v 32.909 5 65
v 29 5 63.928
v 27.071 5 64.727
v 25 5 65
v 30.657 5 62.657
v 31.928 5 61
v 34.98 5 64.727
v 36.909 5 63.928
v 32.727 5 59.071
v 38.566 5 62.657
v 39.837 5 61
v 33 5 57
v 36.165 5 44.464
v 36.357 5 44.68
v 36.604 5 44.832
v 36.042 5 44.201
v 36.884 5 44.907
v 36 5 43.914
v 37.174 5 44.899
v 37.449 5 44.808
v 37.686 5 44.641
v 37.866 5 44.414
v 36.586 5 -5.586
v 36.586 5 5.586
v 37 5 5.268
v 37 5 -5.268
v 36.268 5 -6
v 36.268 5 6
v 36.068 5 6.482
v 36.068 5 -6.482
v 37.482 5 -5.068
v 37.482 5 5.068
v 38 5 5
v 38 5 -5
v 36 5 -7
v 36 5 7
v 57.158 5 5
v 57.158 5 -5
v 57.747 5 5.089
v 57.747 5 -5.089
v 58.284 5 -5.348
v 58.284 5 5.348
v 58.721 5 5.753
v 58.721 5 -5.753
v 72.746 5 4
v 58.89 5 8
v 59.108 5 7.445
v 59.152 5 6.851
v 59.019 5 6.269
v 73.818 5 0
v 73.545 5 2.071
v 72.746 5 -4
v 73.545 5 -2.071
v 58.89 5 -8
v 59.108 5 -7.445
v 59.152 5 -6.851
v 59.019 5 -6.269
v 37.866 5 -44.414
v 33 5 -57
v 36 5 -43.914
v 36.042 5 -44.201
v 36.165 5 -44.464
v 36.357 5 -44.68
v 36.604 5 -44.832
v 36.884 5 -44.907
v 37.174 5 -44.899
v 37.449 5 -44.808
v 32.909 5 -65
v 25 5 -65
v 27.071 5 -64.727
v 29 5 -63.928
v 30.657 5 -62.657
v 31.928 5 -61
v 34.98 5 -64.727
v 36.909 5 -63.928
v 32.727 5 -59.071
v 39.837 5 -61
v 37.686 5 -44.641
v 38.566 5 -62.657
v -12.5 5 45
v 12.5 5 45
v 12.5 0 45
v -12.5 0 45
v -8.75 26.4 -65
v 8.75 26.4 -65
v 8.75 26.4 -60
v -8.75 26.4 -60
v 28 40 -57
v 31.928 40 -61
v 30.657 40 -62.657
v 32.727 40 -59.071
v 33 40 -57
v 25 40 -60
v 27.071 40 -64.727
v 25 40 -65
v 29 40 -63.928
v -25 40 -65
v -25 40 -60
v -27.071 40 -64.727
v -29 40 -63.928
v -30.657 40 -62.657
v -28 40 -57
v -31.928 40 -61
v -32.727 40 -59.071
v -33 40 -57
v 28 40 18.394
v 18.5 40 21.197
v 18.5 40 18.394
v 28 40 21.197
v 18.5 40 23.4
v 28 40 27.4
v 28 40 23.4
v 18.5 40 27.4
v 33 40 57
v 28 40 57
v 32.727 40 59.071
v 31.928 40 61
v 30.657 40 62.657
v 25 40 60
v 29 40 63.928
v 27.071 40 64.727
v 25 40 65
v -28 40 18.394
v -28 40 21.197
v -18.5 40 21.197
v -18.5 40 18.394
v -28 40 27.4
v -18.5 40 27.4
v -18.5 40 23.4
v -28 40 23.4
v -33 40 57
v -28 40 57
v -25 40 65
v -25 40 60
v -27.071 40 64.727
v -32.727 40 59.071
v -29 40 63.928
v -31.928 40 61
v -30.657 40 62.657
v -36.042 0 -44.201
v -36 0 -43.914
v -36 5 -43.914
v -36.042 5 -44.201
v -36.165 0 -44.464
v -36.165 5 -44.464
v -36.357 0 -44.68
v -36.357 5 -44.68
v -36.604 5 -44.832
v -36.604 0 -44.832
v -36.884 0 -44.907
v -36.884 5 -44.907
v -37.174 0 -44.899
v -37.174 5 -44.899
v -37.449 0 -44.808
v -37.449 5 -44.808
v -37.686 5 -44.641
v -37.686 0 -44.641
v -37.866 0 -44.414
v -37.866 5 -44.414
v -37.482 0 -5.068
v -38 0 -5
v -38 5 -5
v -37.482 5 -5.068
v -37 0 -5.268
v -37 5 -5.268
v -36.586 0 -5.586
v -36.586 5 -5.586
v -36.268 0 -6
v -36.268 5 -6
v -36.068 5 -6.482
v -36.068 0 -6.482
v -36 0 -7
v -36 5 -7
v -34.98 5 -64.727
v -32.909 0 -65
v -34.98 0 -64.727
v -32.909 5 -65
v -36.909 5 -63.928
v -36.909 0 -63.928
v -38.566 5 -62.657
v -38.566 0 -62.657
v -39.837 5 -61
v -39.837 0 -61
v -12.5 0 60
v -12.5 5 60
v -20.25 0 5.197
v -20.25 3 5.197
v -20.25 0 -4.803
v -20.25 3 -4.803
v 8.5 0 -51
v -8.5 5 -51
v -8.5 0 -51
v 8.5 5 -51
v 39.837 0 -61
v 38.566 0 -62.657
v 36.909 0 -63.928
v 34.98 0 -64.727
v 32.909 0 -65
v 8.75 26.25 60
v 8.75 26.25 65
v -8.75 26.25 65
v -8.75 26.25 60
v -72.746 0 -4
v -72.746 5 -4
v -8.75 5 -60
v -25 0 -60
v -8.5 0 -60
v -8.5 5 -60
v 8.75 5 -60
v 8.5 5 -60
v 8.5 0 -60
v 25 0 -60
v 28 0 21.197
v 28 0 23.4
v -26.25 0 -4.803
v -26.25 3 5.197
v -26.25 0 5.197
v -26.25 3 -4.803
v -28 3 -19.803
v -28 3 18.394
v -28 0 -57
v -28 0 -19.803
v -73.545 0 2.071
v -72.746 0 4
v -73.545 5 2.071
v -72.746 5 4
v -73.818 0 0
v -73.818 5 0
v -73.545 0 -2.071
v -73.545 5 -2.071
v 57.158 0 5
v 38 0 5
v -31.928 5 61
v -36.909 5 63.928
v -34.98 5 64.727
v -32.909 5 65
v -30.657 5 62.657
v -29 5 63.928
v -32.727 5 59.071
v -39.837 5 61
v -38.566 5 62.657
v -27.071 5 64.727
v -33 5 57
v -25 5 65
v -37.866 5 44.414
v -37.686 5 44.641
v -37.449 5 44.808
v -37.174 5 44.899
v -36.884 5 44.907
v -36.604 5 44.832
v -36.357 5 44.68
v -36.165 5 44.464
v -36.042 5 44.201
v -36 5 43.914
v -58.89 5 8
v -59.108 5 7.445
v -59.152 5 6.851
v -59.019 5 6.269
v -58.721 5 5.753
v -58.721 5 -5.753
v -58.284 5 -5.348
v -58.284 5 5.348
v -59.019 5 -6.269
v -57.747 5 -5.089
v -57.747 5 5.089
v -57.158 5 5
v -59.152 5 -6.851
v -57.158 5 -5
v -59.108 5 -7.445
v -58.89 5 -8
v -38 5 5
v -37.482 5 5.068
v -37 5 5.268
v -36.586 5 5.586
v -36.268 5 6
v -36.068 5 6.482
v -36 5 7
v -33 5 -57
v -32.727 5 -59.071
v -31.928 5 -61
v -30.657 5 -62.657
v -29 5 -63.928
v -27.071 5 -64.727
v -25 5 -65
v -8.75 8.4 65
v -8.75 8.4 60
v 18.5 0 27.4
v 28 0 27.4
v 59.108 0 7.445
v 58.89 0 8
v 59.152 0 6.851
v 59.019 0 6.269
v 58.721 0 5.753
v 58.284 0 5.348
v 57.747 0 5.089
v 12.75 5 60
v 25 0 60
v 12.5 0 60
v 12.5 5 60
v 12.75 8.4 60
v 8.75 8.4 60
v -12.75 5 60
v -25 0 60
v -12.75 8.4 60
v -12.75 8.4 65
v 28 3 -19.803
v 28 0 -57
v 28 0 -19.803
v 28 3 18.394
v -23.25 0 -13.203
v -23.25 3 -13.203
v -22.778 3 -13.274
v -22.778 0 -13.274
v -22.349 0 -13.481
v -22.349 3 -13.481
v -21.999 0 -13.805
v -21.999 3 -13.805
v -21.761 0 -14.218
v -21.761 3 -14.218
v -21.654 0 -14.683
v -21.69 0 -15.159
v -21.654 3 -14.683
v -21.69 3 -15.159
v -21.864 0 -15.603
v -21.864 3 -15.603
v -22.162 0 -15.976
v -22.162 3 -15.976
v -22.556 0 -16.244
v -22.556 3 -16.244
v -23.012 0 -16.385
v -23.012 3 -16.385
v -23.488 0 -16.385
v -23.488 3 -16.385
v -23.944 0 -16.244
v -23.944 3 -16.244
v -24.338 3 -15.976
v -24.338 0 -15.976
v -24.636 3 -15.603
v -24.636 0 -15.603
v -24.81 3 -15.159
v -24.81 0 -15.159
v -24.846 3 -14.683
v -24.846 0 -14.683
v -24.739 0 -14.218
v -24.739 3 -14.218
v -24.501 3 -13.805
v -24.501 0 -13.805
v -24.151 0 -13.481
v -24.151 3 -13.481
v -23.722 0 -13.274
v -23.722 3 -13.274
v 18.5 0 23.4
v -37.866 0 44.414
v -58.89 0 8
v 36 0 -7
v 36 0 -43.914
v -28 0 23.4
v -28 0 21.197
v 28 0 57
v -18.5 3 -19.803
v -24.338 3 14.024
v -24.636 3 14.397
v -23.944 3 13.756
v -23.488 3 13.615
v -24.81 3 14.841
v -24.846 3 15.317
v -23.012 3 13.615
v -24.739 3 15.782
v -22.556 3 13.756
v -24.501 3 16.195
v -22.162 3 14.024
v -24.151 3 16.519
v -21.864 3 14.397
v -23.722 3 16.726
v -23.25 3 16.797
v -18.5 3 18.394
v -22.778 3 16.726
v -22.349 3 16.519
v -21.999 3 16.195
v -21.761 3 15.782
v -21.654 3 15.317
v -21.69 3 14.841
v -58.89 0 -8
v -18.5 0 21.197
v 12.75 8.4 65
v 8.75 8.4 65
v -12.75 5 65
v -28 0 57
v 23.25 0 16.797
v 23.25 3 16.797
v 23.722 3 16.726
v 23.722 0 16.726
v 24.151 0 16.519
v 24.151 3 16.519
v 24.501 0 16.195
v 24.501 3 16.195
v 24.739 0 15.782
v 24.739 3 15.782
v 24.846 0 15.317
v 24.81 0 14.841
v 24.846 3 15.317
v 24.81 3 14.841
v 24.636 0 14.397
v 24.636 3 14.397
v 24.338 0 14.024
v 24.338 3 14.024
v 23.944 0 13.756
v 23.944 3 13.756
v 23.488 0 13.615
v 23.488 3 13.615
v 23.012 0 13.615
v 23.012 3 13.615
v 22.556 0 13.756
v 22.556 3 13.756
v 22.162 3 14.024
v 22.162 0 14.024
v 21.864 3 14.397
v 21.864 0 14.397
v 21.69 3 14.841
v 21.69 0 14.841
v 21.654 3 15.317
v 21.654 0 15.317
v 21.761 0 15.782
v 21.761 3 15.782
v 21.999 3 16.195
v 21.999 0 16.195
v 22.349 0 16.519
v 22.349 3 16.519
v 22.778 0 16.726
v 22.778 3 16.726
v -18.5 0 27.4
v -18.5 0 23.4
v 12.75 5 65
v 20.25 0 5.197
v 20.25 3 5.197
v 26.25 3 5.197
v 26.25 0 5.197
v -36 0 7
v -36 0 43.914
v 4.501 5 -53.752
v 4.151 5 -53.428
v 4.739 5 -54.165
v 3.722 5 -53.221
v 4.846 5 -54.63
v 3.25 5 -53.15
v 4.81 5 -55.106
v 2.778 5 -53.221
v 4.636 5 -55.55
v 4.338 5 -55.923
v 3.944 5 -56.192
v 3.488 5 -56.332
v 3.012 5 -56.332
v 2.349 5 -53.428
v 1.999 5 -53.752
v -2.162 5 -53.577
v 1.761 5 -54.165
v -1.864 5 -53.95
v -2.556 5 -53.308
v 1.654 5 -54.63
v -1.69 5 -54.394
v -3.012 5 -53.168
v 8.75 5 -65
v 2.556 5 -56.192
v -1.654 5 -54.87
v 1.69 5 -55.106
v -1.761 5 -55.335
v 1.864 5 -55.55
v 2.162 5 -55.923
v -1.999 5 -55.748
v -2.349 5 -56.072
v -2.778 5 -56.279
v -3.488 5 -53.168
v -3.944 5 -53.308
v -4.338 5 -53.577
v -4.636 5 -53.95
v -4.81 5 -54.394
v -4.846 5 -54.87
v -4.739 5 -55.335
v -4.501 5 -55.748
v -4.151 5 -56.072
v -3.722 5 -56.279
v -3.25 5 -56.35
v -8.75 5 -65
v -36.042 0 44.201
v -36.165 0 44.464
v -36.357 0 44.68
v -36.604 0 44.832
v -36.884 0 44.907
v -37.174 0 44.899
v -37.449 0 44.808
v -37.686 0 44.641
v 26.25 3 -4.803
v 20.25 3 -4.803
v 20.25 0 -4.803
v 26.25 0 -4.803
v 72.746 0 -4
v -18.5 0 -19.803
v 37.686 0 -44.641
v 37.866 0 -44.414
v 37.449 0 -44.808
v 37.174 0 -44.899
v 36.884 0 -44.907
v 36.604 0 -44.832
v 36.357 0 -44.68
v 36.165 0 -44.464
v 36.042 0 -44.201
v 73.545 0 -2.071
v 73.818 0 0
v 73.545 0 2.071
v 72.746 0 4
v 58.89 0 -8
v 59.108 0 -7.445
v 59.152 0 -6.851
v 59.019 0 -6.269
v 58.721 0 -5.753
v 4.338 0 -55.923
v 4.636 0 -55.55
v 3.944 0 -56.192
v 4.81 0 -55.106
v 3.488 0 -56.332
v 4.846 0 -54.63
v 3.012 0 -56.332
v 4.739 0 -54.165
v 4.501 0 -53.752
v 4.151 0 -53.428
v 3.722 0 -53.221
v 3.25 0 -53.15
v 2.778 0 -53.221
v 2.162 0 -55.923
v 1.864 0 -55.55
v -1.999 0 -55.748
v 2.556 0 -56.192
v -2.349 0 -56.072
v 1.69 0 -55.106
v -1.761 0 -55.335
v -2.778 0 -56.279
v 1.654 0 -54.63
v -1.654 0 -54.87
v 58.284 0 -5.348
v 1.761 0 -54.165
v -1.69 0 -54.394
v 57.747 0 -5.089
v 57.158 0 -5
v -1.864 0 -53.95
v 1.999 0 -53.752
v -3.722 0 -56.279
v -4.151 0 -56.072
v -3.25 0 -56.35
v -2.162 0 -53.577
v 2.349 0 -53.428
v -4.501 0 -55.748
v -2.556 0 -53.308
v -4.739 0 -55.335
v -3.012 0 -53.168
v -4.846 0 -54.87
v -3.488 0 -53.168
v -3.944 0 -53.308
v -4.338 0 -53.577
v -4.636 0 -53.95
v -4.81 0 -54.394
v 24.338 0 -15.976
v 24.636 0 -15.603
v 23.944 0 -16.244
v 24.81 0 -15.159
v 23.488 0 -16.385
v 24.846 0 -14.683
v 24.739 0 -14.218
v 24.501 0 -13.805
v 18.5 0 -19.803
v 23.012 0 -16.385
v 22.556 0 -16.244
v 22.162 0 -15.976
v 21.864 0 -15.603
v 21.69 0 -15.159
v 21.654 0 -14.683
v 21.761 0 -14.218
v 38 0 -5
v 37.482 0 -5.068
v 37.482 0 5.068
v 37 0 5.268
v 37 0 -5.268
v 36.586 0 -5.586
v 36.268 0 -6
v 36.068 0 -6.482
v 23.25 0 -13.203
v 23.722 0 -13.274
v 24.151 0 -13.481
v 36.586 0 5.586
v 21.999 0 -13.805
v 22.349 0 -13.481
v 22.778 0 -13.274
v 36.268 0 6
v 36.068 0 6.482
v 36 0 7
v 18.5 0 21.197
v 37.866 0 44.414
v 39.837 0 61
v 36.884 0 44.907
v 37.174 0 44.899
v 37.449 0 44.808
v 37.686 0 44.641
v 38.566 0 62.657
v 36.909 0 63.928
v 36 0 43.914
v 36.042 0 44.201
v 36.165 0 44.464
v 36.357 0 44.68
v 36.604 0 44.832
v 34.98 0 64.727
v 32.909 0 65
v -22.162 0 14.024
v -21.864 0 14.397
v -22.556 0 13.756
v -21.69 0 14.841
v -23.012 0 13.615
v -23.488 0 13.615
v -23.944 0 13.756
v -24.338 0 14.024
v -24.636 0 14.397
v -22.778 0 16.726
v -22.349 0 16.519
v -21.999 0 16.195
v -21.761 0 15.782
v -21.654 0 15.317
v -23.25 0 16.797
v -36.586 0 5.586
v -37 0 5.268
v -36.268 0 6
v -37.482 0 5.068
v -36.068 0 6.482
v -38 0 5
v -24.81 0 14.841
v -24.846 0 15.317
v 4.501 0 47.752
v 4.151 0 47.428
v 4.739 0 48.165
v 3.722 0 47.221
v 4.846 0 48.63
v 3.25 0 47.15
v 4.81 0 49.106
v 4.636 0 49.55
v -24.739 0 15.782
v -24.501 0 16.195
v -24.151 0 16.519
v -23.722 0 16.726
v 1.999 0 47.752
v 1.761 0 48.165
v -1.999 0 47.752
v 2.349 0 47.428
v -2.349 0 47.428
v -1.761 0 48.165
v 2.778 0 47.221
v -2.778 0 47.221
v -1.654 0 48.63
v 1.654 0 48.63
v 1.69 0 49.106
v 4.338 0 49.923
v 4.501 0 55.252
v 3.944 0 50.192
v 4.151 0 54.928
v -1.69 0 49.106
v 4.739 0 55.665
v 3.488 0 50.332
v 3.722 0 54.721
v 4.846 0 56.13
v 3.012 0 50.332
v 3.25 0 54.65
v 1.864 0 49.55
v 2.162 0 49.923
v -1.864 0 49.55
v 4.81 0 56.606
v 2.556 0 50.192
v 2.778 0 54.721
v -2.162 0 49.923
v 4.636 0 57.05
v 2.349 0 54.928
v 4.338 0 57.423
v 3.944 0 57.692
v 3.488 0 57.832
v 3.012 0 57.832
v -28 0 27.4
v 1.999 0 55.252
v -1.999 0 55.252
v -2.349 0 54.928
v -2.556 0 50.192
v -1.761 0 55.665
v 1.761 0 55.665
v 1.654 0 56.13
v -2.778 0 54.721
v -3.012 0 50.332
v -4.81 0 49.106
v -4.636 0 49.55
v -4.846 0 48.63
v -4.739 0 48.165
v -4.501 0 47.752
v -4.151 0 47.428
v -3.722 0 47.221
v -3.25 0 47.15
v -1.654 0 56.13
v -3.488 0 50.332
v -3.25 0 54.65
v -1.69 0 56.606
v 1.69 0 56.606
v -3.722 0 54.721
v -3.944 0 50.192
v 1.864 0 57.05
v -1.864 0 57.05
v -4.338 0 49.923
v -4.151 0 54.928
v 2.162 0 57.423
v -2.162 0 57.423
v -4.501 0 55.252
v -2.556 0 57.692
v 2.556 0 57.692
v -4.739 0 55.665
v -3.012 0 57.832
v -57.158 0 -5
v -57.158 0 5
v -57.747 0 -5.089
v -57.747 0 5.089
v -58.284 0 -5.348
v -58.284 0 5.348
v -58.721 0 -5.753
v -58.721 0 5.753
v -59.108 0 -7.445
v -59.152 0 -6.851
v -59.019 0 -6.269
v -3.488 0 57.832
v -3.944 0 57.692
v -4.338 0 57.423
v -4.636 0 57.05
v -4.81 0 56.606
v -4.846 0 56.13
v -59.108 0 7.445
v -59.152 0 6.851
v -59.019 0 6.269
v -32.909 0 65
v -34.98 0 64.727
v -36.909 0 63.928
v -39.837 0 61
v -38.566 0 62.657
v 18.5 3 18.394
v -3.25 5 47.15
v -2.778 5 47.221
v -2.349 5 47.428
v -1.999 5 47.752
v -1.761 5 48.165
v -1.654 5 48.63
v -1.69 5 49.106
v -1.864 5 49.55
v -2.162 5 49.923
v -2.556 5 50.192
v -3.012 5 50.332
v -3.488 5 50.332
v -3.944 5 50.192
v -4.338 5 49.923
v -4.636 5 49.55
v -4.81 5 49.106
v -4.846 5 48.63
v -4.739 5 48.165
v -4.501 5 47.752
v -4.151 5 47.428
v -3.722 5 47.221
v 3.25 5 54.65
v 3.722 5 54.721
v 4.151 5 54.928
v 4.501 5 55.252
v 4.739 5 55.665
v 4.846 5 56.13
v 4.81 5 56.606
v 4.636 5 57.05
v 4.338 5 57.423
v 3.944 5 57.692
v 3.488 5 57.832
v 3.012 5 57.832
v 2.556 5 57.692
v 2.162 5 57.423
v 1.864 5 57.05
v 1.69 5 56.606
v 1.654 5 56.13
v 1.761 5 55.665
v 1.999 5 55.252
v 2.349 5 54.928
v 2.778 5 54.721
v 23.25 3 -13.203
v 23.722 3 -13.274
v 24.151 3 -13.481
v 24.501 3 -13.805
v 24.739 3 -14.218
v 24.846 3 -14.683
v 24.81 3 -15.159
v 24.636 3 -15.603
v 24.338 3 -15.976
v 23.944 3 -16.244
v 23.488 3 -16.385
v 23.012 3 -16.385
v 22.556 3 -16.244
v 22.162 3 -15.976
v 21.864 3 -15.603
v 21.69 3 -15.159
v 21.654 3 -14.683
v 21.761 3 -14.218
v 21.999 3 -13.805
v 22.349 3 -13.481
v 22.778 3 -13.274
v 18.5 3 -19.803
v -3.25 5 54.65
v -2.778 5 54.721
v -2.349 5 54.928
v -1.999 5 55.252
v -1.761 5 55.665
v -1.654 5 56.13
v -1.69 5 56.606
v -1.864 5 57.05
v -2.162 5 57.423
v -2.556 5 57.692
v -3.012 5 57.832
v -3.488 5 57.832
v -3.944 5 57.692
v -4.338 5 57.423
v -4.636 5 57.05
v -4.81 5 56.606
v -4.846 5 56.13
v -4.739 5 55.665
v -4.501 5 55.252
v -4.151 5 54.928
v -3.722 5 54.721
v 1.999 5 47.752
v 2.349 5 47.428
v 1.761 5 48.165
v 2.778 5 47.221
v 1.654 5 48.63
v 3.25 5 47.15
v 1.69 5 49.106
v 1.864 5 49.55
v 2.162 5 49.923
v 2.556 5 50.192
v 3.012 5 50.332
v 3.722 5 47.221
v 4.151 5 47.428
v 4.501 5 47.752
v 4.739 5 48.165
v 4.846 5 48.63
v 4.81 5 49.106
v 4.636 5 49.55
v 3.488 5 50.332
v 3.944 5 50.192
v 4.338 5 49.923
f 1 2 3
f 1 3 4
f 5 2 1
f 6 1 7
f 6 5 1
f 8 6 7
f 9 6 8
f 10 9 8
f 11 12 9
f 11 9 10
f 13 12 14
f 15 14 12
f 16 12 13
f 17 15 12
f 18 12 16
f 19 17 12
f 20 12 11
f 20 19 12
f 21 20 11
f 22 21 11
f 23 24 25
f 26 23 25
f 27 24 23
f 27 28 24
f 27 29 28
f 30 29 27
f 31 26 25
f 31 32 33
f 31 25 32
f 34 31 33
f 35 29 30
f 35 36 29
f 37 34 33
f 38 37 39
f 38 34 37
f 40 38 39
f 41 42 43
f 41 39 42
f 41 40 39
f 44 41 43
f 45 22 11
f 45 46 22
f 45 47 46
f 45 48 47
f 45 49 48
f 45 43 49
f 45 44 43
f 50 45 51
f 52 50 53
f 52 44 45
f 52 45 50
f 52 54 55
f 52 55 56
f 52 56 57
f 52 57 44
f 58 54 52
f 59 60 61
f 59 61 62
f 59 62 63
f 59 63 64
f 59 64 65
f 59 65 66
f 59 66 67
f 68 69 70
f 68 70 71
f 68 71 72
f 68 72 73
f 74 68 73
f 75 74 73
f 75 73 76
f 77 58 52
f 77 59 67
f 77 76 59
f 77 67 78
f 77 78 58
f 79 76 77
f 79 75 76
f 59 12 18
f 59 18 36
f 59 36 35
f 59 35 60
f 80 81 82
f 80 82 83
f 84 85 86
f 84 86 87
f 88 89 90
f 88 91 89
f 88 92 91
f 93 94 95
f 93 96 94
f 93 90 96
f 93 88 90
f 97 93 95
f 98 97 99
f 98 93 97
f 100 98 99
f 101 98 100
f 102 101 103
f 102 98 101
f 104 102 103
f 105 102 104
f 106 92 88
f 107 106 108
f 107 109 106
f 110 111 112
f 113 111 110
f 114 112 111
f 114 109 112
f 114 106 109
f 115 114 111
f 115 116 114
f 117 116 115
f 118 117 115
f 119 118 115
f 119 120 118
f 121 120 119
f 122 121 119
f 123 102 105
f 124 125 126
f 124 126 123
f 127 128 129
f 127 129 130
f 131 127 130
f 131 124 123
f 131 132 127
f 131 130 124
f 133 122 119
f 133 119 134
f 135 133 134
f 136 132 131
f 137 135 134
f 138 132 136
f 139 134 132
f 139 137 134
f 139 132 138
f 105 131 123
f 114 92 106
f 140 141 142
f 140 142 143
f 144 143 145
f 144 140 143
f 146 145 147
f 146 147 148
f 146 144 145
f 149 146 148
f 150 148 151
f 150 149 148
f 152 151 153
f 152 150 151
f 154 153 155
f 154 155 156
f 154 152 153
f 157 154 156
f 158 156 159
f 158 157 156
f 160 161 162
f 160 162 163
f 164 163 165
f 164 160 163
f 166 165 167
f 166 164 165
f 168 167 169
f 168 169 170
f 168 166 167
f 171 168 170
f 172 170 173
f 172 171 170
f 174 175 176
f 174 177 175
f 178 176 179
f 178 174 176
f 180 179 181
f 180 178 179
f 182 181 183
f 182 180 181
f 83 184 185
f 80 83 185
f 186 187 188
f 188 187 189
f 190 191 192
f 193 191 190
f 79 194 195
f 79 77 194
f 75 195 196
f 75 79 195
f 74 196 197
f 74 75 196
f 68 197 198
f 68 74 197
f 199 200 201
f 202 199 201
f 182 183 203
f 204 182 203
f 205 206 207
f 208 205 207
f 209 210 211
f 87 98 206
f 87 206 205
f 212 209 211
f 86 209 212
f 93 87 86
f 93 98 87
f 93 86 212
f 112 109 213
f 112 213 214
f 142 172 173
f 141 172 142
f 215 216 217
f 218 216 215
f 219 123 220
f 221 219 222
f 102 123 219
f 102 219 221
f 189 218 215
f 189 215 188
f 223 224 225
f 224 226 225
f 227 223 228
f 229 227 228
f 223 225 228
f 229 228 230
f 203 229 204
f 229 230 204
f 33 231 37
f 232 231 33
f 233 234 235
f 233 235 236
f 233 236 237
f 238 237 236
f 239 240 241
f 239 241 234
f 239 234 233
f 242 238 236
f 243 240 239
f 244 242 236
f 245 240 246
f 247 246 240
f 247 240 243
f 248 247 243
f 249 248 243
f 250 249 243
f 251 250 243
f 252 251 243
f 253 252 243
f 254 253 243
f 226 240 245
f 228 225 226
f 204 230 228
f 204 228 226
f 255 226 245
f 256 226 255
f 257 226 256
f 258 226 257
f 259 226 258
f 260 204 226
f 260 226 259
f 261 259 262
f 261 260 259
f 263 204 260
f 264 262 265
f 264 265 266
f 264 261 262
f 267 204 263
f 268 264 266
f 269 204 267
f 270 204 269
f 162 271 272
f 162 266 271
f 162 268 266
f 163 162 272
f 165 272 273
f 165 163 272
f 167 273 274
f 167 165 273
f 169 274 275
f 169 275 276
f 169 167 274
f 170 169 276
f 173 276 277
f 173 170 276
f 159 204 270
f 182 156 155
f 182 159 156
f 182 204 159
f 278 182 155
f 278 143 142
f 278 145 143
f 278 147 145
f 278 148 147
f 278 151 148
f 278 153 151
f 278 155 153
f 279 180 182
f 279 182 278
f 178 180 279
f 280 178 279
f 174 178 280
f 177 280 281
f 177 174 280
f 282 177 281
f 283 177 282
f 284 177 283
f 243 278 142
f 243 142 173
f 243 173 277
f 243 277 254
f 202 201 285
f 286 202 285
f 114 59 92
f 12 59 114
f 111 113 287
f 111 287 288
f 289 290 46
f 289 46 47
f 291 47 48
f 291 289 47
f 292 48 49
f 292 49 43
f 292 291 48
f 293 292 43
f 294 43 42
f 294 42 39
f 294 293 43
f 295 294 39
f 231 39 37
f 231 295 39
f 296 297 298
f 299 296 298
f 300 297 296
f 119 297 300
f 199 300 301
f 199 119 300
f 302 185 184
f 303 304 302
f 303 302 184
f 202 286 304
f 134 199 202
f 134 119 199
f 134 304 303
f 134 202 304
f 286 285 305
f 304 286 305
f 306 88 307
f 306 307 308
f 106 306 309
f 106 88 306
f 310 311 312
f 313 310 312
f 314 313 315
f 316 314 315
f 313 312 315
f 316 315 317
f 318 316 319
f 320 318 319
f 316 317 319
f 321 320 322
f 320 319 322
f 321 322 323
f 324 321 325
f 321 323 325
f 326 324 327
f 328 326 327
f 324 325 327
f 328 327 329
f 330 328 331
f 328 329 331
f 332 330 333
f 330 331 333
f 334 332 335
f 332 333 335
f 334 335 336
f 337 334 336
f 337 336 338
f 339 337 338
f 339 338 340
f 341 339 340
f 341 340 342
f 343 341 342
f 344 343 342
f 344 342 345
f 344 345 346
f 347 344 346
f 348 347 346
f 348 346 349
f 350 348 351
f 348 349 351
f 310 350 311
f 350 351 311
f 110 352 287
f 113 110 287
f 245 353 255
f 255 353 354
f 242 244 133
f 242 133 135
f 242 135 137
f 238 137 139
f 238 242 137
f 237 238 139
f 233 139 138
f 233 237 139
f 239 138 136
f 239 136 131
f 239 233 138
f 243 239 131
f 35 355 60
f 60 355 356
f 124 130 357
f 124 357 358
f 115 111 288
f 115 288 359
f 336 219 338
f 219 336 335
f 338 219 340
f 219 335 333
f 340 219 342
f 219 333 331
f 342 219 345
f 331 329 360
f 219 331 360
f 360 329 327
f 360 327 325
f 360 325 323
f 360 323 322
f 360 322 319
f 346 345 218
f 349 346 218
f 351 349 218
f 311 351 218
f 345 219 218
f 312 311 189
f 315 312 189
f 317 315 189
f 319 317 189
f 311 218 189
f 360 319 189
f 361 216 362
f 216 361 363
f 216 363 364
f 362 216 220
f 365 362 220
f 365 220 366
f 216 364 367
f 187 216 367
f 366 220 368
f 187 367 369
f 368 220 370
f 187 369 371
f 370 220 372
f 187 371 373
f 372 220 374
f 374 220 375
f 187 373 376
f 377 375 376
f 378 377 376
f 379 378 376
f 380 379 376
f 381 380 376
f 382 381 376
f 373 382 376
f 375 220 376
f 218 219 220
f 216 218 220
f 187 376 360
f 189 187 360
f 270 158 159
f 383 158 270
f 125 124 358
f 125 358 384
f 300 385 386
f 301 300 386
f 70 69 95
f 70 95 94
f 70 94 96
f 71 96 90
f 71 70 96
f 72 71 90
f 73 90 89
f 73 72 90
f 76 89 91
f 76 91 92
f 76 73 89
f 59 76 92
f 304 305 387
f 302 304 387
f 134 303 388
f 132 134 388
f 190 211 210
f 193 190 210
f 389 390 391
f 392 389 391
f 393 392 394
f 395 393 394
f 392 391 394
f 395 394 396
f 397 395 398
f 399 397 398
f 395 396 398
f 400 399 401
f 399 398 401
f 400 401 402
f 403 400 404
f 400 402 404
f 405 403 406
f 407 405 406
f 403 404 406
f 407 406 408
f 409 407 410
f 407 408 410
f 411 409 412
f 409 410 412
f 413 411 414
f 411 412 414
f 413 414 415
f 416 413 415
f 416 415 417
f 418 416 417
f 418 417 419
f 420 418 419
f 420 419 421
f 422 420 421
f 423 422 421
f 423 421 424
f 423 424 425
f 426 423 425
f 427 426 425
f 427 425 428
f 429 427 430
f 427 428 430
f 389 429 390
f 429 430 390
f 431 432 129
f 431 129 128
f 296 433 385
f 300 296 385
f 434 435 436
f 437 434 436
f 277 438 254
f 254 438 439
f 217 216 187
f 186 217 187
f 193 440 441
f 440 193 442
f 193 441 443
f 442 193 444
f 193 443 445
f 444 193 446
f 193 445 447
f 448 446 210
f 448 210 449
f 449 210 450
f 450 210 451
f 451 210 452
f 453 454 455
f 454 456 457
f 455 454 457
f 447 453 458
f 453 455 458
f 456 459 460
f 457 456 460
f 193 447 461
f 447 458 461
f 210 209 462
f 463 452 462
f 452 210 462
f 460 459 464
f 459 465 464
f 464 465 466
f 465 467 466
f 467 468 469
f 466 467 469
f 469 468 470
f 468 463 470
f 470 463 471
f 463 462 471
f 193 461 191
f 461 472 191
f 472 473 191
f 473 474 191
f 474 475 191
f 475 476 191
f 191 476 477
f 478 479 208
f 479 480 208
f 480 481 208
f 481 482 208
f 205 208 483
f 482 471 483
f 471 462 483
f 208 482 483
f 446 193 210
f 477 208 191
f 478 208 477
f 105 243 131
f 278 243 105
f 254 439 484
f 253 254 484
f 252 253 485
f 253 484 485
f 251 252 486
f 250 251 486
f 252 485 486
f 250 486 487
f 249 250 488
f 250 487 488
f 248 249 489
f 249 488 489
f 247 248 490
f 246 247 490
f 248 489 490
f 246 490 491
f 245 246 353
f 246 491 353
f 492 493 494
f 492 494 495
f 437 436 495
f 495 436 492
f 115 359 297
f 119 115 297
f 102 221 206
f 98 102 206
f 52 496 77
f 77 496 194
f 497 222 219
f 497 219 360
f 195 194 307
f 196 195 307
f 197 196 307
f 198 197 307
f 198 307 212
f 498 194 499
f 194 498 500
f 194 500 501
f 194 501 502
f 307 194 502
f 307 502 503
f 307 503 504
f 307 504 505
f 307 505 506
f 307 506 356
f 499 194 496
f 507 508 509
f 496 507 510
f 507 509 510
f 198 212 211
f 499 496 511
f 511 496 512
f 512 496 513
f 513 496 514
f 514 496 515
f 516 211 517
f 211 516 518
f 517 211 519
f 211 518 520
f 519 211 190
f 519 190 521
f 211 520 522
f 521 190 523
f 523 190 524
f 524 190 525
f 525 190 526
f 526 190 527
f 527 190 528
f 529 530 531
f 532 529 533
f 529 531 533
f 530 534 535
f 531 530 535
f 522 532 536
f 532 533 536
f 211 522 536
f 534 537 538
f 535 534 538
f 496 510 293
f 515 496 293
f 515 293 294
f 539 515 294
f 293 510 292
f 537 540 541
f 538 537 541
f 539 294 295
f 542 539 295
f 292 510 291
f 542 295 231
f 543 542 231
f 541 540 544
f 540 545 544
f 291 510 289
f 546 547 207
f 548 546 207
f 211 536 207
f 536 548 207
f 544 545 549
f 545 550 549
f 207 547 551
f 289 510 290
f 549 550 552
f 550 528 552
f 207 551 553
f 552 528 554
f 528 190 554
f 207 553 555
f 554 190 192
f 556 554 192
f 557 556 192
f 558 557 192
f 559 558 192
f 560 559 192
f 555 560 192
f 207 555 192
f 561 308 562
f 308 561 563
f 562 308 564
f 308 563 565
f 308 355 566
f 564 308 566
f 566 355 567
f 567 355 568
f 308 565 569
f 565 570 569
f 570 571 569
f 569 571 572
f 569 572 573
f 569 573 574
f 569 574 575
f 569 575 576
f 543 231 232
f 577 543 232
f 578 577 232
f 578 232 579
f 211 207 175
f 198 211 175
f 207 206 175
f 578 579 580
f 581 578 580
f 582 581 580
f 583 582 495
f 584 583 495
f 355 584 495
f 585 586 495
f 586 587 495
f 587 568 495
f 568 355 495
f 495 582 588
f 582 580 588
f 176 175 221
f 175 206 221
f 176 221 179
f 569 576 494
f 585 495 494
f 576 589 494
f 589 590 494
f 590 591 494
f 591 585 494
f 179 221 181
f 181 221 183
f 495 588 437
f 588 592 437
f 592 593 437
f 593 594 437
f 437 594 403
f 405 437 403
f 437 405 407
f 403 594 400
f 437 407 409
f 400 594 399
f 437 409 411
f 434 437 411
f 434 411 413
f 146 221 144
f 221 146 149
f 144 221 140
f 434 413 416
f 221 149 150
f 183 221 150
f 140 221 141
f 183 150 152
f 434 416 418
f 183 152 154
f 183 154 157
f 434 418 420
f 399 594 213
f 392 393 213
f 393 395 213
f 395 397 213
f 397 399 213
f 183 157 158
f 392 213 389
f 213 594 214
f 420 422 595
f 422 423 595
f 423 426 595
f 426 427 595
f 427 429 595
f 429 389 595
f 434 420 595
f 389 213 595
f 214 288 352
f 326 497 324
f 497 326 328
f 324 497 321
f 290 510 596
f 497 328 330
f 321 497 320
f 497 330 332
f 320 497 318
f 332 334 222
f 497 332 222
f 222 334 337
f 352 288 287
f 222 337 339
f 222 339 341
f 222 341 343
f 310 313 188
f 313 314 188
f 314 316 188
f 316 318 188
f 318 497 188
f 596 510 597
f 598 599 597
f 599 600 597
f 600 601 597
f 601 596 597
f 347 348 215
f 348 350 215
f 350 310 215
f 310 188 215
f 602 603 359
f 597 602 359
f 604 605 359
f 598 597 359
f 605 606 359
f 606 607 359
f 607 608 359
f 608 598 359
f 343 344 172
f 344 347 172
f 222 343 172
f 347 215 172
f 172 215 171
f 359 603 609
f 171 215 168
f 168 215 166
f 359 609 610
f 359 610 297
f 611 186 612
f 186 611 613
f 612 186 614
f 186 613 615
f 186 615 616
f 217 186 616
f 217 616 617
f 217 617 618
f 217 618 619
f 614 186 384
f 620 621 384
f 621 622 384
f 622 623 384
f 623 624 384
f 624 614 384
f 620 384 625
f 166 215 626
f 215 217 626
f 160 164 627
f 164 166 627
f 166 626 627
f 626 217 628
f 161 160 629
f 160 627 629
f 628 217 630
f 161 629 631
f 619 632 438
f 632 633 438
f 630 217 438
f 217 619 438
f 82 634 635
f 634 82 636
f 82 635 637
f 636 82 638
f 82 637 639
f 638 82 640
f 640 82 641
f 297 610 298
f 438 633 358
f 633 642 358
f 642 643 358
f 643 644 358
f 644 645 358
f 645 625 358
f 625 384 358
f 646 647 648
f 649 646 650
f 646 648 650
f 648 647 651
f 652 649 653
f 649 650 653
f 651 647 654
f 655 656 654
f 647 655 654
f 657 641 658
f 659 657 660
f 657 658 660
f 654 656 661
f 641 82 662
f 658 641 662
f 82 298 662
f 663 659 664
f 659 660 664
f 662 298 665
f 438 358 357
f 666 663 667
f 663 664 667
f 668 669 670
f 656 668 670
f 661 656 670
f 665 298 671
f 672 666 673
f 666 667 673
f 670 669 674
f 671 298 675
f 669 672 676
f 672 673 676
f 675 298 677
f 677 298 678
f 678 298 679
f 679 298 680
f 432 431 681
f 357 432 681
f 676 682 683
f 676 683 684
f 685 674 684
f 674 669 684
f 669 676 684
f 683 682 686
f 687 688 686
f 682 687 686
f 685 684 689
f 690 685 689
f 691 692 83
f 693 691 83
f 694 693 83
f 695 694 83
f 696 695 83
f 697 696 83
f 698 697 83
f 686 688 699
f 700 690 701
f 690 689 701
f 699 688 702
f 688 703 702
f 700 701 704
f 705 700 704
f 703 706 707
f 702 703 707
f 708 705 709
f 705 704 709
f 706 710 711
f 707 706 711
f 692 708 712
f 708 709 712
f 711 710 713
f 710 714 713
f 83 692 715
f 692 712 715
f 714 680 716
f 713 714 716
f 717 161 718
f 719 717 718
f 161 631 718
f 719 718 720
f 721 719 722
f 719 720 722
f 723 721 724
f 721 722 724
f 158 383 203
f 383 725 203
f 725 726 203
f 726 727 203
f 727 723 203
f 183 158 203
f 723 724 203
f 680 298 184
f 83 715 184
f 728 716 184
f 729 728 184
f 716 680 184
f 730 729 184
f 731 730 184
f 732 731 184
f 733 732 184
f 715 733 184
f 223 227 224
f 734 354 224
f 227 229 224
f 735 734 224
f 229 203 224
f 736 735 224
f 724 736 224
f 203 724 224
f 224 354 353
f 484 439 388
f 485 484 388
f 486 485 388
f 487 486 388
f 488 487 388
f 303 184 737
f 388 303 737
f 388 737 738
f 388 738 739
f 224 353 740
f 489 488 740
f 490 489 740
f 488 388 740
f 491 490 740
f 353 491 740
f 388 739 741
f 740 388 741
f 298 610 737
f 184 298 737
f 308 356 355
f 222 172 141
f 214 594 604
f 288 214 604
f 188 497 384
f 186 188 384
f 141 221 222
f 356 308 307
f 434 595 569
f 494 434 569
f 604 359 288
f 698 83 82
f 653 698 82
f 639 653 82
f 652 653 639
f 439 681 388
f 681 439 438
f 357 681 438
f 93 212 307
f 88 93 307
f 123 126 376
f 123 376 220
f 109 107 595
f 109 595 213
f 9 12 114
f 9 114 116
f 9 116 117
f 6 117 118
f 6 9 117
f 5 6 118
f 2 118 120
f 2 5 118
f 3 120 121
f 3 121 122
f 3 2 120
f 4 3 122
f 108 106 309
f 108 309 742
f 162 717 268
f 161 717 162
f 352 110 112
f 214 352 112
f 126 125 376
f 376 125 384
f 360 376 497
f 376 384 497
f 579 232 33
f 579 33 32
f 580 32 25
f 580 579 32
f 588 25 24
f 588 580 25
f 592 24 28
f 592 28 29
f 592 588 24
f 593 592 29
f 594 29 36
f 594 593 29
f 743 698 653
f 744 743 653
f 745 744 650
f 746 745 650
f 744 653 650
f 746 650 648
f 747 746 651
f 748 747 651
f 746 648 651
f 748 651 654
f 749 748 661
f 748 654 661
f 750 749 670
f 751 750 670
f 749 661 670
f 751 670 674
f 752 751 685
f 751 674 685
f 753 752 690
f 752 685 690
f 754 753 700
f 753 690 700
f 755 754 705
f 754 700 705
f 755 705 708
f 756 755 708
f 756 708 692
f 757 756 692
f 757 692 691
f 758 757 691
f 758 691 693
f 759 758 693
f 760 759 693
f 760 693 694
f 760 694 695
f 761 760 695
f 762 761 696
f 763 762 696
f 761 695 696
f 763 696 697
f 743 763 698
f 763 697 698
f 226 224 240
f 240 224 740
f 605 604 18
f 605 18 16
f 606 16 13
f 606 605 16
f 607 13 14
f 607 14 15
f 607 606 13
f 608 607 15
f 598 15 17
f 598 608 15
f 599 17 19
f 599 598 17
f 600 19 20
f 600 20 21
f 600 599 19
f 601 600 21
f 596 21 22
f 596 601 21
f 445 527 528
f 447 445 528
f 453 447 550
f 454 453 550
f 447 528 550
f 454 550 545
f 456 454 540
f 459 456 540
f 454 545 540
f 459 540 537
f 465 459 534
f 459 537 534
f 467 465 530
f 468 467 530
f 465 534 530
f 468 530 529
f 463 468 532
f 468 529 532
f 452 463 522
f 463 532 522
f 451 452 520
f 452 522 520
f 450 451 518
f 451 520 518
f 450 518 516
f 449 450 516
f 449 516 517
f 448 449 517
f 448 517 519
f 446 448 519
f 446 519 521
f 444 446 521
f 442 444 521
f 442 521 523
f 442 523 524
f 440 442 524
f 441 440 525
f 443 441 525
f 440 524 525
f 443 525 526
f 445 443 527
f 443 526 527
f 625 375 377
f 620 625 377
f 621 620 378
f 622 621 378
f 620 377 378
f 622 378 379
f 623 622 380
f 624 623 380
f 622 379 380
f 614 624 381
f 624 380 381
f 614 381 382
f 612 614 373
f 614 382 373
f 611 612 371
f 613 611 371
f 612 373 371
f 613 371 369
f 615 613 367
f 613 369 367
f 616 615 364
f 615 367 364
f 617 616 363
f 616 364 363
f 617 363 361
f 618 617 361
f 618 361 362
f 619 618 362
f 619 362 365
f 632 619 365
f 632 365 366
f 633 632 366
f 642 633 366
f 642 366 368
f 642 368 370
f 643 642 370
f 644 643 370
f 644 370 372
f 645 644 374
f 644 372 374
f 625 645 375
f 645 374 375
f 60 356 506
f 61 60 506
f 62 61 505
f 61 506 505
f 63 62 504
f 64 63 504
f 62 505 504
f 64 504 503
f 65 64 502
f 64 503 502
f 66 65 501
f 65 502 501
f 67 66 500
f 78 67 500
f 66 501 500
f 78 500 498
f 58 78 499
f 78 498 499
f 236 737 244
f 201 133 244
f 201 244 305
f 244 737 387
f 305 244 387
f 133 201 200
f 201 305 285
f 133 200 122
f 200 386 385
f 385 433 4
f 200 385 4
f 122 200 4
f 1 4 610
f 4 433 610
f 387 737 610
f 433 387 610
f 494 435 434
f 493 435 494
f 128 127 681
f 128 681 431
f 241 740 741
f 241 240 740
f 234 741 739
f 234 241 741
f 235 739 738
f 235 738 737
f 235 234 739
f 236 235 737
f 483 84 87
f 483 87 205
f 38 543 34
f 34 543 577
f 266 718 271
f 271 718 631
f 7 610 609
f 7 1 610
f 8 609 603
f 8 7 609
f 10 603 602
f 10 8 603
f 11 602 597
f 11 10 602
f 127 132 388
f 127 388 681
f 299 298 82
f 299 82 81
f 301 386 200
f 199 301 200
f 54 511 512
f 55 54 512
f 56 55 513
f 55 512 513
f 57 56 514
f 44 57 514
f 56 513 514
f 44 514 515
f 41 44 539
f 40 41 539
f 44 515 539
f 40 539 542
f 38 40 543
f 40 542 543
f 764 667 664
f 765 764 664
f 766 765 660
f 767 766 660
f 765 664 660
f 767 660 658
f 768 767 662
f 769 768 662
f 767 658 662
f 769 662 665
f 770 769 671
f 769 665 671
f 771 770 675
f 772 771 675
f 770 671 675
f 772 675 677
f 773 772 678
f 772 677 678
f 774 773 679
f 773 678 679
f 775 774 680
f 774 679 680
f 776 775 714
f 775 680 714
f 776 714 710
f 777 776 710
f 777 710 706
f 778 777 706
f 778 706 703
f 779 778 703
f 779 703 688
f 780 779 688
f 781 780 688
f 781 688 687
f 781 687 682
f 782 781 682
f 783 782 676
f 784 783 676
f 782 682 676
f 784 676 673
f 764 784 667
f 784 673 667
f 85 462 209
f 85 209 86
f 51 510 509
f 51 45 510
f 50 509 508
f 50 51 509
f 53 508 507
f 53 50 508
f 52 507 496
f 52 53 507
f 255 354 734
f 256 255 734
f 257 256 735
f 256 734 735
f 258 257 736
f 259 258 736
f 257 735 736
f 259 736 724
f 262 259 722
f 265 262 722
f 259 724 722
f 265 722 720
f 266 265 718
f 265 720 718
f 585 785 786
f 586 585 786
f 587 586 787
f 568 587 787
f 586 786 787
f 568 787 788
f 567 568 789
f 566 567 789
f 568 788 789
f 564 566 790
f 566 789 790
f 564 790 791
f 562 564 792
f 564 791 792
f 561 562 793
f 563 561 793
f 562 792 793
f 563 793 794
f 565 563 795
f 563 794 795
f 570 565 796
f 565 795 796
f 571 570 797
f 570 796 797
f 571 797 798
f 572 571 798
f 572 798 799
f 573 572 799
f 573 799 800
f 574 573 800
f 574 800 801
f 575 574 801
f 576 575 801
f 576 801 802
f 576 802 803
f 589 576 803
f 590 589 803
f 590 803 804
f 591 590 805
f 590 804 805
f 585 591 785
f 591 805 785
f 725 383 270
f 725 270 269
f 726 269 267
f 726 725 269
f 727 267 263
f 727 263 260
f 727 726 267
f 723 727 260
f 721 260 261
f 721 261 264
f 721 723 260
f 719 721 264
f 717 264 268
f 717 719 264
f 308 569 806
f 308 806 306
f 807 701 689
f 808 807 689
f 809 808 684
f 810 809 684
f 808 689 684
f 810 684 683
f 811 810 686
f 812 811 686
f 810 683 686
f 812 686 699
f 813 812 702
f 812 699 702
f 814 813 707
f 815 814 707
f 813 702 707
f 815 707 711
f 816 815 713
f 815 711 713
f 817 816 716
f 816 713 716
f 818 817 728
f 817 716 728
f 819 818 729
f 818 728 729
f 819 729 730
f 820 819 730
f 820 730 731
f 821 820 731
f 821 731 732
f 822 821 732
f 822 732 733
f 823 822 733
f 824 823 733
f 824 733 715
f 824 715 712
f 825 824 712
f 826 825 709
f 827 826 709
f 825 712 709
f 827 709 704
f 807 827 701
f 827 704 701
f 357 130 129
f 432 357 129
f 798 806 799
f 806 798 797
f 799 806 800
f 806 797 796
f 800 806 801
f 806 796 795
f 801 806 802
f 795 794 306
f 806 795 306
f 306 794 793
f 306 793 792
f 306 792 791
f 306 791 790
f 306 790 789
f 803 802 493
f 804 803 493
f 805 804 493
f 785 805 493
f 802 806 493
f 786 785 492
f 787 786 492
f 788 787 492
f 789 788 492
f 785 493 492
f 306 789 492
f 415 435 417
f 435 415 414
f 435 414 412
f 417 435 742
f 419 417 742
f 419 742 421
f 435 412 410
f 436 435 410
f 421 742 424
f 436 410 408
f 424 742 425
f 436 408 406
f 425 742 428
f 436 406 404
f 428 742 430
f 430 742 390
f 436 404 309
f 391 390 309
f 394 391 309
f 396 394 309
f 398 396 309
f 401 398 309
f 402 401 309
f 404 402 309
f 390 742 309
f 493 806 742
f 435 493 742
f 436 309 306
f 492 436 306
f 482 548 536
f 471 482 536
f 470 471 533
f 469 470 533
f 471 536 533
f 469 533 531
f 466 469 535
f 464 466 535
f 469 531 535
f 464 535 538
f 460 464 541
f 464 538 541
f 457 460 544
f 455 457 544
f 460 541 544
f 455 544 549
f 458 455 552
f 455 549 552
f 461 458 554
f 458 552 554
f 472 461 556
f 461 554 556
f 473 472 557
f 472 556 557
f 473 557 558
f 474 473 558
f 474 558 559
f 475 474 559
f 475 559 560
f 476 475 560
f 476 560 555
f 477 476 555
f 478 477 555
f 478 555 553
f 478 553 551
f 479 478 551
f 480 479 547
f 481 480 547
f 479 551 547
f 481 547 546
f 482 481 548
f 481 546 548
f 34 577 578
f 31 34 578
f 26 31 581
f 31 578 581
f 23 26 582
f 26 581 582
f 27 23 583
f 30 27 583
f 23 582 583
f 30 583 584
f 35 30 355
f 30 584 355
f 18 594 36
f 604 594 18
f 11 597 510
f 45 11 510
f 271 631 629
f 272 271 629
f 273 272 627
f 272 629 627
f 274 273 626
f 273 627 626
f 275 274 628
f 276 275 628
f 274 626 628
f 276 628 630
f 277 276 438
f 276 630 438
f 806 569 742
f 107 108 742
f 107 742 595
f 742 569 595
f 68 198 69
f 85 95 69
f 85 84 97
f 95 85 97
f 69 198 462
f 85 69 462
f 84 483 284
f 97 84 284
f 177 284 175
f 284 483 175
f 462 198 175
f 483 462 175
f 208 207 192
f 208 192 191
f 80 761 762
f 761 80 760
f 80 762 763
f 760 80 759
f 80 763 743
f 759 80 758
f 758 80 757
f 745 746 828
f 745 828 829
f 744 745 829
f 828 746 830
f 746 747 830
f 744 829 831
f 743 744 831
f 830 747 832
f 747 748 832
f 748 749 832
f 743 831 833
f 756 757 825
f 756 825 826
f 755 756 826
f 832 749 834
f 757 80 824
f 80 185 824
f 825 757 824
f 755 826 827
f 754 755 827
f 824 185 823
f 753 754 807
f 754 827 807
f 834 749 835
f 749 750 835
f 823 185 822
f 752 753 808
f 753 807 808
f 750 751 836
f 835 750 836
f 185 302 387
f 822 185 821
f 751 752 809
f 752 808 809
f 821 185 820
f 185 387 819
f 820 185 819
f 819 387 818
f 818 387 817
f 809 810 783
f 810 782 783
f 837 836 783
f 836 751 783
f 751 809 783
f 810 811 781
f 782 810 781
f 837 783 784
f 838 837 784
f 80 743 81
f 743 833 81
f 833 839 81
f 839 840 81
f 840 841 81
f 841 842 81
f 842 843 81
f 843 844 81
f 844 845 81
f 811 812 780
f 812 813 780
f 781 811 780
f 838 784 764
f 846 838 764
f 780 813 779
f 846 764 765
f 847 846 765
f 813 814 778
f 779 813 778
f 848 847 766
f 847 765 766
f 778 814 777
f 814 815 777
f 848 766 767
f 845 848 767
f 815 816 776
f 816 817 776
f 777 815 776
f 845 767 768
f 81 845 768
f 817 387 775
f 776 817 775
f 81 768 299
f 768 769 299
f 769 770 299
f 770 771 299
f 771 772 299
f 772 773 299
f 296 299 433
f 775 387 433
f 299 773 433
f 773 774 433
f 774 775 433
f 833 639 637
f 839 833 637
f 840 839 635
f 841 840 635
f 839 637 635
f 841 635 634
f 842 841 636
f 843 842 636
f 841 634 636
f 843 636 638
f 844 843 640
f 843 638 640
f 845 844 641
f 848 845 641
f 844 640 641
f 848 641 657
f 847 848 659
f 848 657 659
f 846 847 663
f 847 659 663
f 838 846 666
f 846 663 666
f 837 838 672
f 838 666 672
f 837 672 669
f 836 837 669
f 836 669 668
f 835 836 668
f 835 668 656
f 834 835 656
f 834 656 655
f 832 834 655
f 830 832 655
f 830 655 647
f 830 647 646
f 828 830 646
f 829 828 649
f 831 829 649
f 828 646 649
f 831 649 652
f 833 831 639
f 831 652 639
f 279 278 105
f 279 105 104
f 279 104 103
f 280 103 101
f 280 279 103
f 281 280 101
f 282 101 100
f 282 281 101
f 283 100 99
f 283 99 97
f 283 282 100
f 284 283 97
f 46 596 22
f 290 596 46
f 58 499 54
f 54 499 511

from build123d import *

# Parameters (mm, degrees)
BOSS_EXTRUDE1_DEPTH = 5
FILLET1_R           = 8
BOSS_EXTRUDE2_DEPTH = 35
CUT_EXTRUDE1_DEPTH  = 40
CUT_EXTRUDE2_DEPTH  = 5
SKETCH9_W           = 9.5
SKETCH9_H           = 40
BOSS_EXTRUDE3_DEPTH = 3
SKETCH10_R          = 1.6
SKETCH10_W          = 6
SKETCH10_H          = 10
CUT_EXTRUDE3_DEPTH  = 3
SKETCH11_W          = 9.5
SKETCH11_H          = 4
BOSS_EXTRUDE4_DEPTH = 40
SKETCH13_W          = 25
SKETCH13_H          = 5
BOSS_EXTRUDE5_DEPTH = 15
SKETCH15_R          = 1.6
CUT_EXTRUDE4_DEPTH  = 5
CUT_EXTRUDE5_DEPTH  = 5
SKETCH17_W          = 17
SKETCH17_H          = 5
BOSS_EXTRUDE6_DEPTH = 9
SKETCH18_R          = 1.6
CUT_EXTRUDE6_DEPTH  = 5
CUT_EXTRUDE8_DEPTH  = 5


with BuildPart() as part:
    # Sketch1 → Boss-Extrude1 (new body)
    with BuildSketch(Plane(origin=(0, 0, 0), x_dir=(1, 0, 0), z_dir=(0, 1, 0))):
        Polygon((-75.055534995, 0), (-37.527767497, -65), (37.527767497, -65), (75.055534995, 0), (37.527767497, 65), (-37.527767497, 65), align=None)
    extrude(amount=BOSS_EXTRUDE1_DEPTH)

    # Fillet1
    fillet1_edges = [part.edges().sort_by_distance(p)[0] for p in [
        (-37.527767497, 2.5, -65),
        (37.527767497, 2.5, -65),
        (75.055534995, 2.5, 0),
        (37.527767497, 2.5, 65),
        (-37.527767497, 2.5, 65),
        (-75.055534995, 2.5, 0),
    ]]
    fillet(fillet1_edges, radius=FILLET1_R)

    # Sketch3 → Boss-Extrude2 (add)
    with BuildSketch(Plane(origin=(0, 5, 0), x_dir=(1, 0, 0), z_dir=(0, 1, 0))):
        with BuildLine():
            Line((-25, 65), (25, 65))
            ThreePointArc((25, 65), (30.656854249, 62.656854249), (33, 57))
            Line((33, 57), (33, -57))
            ThreePointArc((33, -57), (30.656854249, -62.656854249), (25, -65))
            Line((25, -65), (-25, -65))
            ThreePointArc((-25, -65), (-30.656854249, -62.656854249), (-33, -57))
            Line((-33, -57), (-33, 57))
            ThreePointArc((-33, 57), (-30.656854249, 62.656854249), (-25, 65))
        make_face()
    extrude(amount=BOSS_EXTRUDE2_DEPTH)

    # Sketch4 → Cut-Extrude1 (cut)
    with BuildSketch(Plane(origin=(0, 40, 0), x_dir=(1, 0, 0), z_dir=(0, 1, 0))):
        Polygon((-28, 57), (-25, 60), (25, 60), (28, 57), (28, -57), (25, -60), (-25, -60), (-28, -57), align=None)
    extrude(amount=-CUT_EXTRUDE1_DEPTH, mode=Mode.SUBTRACT)

    # Sketch8 → Cut-Extrude2 (cut)
    with BuildSketch(Plane(origin=(0, 0, 0), x_dir=(1, 0, 0), z_dir=(0, 1, 0))):
        with BuildLine():
            Line((-37.866025404, 44.41412012), (-58.889727457, 8))
            ThreePointArc((-58.889727457, 8), (-58.889727457, 6), (-57.15767665, 5))
            Line((-57.15767665, 5), (-38, 5))
            ThreePointArc((-38, 5), (-36.585786438, 5.585786438), (-36, 7))
            Line((-36, 7), (-36, 43.91412012))
            ThreePointArc((-36, 43.91412012), (-36.741180955, 44.880045946), (-37.866025404, 44.41412012))
        make_face()
        with BuildLine():
            Line((-36, -7), (-36, -43.91412012))
            ThreePointArc((-36, -43.91412012), (-36.741180955, -44.880045946), (-37.866025404, -44.41412012))
            Line((-37.866025404, -44.41412012), (-58.889727457, -8))
            ThreePointArc((-58.889727457, -8), (-58.889727457, -6), (-57.15767665, -5))
            Line((-57.15767665, -5), (-38, -5))
            ThreePointArc((-38, -5), (-36.585786438, -5.585786438), (-36, -7))
        make_face()
        with BuildLine():
            Line((37.866025404, -44.41412012), (58.889727457, -8))
            ThreePointArc((58.889727457, -8), (58.889727457, -6), (57.15767665, -5))
            Line((57.15767665, -5), (38, -5))
            ThreePointArc((38, -5), (36.585786438, -5.585786438), (36, -7))
            Line((36, -7), (36, -43.91412012))
            ThreePointArc((36, -43.91412012), (36.741180955, -44.880045946), (37.866025404, -44.41412012))
        make_face()
        with BuildLine():
            Line((36, 7), (36, 43.91412012))
            ThreePointArc((36, 43.91412012), (36.741180955, 44.880045946), (37.866025404, 44.41412012))
            Line((37.866025404, 44.41412012), (58.889727457, 8))
            ThreePointArc((58.889727457, 8), (58.889727457, 6), (57.15767665, 5))
            Line((57.15767665, 5), (38, 5))
            ThreePointArc((38, 5), (36.585786438, 5.585786438), (36, 7))
        make_face()
    extrude(amount=CUT_EXTRUDE2_DEPTH, mode=Mode.SUBTRACT)

    # Sketch9 → Boss-Extrude3 (add)
    with BuildSketch(Plane.XZ):
        with Locations((23.25, 0.197193855)):
            Rectangle(SKETCH9_W, SKETCH9_H)
        with Locations((-23.25, 0.197193855)):
            Rectangle(SKETCH9_W, SKETCH9_H)
    extrude(amount=-BOSS_EXTRUDE3_DEPTH)

    # Sketch10 → Cut-Extrude3 (cut)
    with BuildSketch(Plane(origin=(0, 3, 0), x_dir=(1, 0, 0), z_dir=(0, 1, 0))):
        with Locations(Location((23.25, -15.197193855, 0), (0, 0, 270))):
            Circle(SKETCH10_R)
        with Locations(Location((23.25, 14.802806145, 0), (0, 0, 270))):
            Circle(SKETCH10_R)
        with Locations(Location((-23.25, 14.802806145, 0), (0, 0, 270))):
            Circle(SKETCH10_R)
        with Locations(Location((-23.25, -15.197193855, 0), (0, 0, 270))):
            Circle(SKETCH10_R)
        with Locations((23.25, -0.197193855)):
            Rectangle(SKETCH10_W, SKETCH10_H)
        with Locations((-23.25, -0.197193855)):
            Rectangle(SKETCH10_W, SKETCH10_H)
    extrude(amount=-CUT_EXTRUDE3_DEPTH, mode=Mode.SUBTRACT)

    # Sketch11 → Boss-Extrude4 (add)
    with BuildSketch(Plane.XZ):
        with Locations((-23.25, 25.399999855)):
            Rectangle(SKETCH11_W, SKETCH11_H)
        Polygon((-28, 20.197193855), (-28, 21.197193855), (-18.5, 21.197193855), (-18.5, 18.394387855), (-28, 18.394387855), align=None)
        with Locations((23.25, 25.399999855)):
            Rectangle(SKETCH11_W, SKETCH11_H)
        Polygon((18.5, 21.197193855), (28, 21.197193855), (28, 20.197193855), (28, 18.394387855), (18.5, 18.394387855), align=None)
    extrude(amount=-BOSS_EXTRUDE4_DEPTH)

    # Sketch13 → Boss-Extrude5 (add)
    with BuildSketch(Plane(origin=(0, 0, 60), x_dir=(-1, 0, 0), z_dir=(0, 0, -1))):
        with Locations((0, 2.5)):
            Rectangle(SKETCH13_W, SKETCH13_H)
    extrude(amount=BOSS_EXTRUDE5_DEPTH)

    # Sketch15 → Cut-Extrude4 (cut)
    with BuildSketch(Plane.XZ):
        with Locations(Location((3.25, 48.75, 0), (0, 0, 270))):
            Circle(SKETCH15_R)
        with Locations(Location((3.25, 56.25, 0), (0, 0, 270))):
            Circle(SKETCH15_R)
        with Locations(Location((-3.25, 48.75, 0), (0, 0, 270))):
            Circle(SKETCH15_R)
        with Locations(Location((-3.25, 56.25, 0), (0, 0, 270))):
            Circle(SKETCH15_R)
    extrude(amount=-CUT_EXTRUDE4_DEPTH, mode=Mode.SUBTRACT)

    # Sketch16 → Cut-Extrude5 (cut)
    with BuildSketch(Plane.XY.offset(65)):
        Polygon((-12.75, 5), (12.75, 5), (12.75, 8.4), (8.75, 8.4), (8.75, 26.25), (-8.75, 26.25), (-8.75, 8.4), (-12.75, 8.4), align=None)
    extrude(amount=-CUT_EXTRUDE5_DEPTH, mode=Mode.SUBTRACT)

    # Sketch17 → Boss-Extrude6 (add)
    with BuildSketch(Plane.XY.offset(-60)):
        with Locations((0, 2.5)):
            Rectangle(SKETCH17_W, SKETCH17_H)
    extrude(amount=BOSS_EXTRUDE6_DEPTH)

    # Sketch18 → Cut-Extrude6 (cut)
    with BuildSketch(Plane.XZ):
        with Locations(Location((-3.25, -54.75, 0), (0, 0, 270))):
            Circle(SKETCH18_R)
        with Locations(Location((3.25, -54.75, 0), (0, 0, 90))):
            Circle(SKETCH18_R)
    extrude(amount=-CUT_EXTRUDE6_DEPTH, mode=Mode.SUBTRACT)

    # Sketch19 → Cut-Extrude8 (cut)
    with BuildSketch(Plane(origin=(0, 0, -65), x_dir=(-1, 0, 0), z_dir=(0, 0, -1))):
        Polygon((0, 5), (-8.75, 5), (-8.75, 26.4), (8.75, 26.4), (8.75, 5), align=None)
    extrude(amount=-CUT_EXTRUDE8_DEPTH, mode=Mode.SUBTRACT)


solid = part.part
